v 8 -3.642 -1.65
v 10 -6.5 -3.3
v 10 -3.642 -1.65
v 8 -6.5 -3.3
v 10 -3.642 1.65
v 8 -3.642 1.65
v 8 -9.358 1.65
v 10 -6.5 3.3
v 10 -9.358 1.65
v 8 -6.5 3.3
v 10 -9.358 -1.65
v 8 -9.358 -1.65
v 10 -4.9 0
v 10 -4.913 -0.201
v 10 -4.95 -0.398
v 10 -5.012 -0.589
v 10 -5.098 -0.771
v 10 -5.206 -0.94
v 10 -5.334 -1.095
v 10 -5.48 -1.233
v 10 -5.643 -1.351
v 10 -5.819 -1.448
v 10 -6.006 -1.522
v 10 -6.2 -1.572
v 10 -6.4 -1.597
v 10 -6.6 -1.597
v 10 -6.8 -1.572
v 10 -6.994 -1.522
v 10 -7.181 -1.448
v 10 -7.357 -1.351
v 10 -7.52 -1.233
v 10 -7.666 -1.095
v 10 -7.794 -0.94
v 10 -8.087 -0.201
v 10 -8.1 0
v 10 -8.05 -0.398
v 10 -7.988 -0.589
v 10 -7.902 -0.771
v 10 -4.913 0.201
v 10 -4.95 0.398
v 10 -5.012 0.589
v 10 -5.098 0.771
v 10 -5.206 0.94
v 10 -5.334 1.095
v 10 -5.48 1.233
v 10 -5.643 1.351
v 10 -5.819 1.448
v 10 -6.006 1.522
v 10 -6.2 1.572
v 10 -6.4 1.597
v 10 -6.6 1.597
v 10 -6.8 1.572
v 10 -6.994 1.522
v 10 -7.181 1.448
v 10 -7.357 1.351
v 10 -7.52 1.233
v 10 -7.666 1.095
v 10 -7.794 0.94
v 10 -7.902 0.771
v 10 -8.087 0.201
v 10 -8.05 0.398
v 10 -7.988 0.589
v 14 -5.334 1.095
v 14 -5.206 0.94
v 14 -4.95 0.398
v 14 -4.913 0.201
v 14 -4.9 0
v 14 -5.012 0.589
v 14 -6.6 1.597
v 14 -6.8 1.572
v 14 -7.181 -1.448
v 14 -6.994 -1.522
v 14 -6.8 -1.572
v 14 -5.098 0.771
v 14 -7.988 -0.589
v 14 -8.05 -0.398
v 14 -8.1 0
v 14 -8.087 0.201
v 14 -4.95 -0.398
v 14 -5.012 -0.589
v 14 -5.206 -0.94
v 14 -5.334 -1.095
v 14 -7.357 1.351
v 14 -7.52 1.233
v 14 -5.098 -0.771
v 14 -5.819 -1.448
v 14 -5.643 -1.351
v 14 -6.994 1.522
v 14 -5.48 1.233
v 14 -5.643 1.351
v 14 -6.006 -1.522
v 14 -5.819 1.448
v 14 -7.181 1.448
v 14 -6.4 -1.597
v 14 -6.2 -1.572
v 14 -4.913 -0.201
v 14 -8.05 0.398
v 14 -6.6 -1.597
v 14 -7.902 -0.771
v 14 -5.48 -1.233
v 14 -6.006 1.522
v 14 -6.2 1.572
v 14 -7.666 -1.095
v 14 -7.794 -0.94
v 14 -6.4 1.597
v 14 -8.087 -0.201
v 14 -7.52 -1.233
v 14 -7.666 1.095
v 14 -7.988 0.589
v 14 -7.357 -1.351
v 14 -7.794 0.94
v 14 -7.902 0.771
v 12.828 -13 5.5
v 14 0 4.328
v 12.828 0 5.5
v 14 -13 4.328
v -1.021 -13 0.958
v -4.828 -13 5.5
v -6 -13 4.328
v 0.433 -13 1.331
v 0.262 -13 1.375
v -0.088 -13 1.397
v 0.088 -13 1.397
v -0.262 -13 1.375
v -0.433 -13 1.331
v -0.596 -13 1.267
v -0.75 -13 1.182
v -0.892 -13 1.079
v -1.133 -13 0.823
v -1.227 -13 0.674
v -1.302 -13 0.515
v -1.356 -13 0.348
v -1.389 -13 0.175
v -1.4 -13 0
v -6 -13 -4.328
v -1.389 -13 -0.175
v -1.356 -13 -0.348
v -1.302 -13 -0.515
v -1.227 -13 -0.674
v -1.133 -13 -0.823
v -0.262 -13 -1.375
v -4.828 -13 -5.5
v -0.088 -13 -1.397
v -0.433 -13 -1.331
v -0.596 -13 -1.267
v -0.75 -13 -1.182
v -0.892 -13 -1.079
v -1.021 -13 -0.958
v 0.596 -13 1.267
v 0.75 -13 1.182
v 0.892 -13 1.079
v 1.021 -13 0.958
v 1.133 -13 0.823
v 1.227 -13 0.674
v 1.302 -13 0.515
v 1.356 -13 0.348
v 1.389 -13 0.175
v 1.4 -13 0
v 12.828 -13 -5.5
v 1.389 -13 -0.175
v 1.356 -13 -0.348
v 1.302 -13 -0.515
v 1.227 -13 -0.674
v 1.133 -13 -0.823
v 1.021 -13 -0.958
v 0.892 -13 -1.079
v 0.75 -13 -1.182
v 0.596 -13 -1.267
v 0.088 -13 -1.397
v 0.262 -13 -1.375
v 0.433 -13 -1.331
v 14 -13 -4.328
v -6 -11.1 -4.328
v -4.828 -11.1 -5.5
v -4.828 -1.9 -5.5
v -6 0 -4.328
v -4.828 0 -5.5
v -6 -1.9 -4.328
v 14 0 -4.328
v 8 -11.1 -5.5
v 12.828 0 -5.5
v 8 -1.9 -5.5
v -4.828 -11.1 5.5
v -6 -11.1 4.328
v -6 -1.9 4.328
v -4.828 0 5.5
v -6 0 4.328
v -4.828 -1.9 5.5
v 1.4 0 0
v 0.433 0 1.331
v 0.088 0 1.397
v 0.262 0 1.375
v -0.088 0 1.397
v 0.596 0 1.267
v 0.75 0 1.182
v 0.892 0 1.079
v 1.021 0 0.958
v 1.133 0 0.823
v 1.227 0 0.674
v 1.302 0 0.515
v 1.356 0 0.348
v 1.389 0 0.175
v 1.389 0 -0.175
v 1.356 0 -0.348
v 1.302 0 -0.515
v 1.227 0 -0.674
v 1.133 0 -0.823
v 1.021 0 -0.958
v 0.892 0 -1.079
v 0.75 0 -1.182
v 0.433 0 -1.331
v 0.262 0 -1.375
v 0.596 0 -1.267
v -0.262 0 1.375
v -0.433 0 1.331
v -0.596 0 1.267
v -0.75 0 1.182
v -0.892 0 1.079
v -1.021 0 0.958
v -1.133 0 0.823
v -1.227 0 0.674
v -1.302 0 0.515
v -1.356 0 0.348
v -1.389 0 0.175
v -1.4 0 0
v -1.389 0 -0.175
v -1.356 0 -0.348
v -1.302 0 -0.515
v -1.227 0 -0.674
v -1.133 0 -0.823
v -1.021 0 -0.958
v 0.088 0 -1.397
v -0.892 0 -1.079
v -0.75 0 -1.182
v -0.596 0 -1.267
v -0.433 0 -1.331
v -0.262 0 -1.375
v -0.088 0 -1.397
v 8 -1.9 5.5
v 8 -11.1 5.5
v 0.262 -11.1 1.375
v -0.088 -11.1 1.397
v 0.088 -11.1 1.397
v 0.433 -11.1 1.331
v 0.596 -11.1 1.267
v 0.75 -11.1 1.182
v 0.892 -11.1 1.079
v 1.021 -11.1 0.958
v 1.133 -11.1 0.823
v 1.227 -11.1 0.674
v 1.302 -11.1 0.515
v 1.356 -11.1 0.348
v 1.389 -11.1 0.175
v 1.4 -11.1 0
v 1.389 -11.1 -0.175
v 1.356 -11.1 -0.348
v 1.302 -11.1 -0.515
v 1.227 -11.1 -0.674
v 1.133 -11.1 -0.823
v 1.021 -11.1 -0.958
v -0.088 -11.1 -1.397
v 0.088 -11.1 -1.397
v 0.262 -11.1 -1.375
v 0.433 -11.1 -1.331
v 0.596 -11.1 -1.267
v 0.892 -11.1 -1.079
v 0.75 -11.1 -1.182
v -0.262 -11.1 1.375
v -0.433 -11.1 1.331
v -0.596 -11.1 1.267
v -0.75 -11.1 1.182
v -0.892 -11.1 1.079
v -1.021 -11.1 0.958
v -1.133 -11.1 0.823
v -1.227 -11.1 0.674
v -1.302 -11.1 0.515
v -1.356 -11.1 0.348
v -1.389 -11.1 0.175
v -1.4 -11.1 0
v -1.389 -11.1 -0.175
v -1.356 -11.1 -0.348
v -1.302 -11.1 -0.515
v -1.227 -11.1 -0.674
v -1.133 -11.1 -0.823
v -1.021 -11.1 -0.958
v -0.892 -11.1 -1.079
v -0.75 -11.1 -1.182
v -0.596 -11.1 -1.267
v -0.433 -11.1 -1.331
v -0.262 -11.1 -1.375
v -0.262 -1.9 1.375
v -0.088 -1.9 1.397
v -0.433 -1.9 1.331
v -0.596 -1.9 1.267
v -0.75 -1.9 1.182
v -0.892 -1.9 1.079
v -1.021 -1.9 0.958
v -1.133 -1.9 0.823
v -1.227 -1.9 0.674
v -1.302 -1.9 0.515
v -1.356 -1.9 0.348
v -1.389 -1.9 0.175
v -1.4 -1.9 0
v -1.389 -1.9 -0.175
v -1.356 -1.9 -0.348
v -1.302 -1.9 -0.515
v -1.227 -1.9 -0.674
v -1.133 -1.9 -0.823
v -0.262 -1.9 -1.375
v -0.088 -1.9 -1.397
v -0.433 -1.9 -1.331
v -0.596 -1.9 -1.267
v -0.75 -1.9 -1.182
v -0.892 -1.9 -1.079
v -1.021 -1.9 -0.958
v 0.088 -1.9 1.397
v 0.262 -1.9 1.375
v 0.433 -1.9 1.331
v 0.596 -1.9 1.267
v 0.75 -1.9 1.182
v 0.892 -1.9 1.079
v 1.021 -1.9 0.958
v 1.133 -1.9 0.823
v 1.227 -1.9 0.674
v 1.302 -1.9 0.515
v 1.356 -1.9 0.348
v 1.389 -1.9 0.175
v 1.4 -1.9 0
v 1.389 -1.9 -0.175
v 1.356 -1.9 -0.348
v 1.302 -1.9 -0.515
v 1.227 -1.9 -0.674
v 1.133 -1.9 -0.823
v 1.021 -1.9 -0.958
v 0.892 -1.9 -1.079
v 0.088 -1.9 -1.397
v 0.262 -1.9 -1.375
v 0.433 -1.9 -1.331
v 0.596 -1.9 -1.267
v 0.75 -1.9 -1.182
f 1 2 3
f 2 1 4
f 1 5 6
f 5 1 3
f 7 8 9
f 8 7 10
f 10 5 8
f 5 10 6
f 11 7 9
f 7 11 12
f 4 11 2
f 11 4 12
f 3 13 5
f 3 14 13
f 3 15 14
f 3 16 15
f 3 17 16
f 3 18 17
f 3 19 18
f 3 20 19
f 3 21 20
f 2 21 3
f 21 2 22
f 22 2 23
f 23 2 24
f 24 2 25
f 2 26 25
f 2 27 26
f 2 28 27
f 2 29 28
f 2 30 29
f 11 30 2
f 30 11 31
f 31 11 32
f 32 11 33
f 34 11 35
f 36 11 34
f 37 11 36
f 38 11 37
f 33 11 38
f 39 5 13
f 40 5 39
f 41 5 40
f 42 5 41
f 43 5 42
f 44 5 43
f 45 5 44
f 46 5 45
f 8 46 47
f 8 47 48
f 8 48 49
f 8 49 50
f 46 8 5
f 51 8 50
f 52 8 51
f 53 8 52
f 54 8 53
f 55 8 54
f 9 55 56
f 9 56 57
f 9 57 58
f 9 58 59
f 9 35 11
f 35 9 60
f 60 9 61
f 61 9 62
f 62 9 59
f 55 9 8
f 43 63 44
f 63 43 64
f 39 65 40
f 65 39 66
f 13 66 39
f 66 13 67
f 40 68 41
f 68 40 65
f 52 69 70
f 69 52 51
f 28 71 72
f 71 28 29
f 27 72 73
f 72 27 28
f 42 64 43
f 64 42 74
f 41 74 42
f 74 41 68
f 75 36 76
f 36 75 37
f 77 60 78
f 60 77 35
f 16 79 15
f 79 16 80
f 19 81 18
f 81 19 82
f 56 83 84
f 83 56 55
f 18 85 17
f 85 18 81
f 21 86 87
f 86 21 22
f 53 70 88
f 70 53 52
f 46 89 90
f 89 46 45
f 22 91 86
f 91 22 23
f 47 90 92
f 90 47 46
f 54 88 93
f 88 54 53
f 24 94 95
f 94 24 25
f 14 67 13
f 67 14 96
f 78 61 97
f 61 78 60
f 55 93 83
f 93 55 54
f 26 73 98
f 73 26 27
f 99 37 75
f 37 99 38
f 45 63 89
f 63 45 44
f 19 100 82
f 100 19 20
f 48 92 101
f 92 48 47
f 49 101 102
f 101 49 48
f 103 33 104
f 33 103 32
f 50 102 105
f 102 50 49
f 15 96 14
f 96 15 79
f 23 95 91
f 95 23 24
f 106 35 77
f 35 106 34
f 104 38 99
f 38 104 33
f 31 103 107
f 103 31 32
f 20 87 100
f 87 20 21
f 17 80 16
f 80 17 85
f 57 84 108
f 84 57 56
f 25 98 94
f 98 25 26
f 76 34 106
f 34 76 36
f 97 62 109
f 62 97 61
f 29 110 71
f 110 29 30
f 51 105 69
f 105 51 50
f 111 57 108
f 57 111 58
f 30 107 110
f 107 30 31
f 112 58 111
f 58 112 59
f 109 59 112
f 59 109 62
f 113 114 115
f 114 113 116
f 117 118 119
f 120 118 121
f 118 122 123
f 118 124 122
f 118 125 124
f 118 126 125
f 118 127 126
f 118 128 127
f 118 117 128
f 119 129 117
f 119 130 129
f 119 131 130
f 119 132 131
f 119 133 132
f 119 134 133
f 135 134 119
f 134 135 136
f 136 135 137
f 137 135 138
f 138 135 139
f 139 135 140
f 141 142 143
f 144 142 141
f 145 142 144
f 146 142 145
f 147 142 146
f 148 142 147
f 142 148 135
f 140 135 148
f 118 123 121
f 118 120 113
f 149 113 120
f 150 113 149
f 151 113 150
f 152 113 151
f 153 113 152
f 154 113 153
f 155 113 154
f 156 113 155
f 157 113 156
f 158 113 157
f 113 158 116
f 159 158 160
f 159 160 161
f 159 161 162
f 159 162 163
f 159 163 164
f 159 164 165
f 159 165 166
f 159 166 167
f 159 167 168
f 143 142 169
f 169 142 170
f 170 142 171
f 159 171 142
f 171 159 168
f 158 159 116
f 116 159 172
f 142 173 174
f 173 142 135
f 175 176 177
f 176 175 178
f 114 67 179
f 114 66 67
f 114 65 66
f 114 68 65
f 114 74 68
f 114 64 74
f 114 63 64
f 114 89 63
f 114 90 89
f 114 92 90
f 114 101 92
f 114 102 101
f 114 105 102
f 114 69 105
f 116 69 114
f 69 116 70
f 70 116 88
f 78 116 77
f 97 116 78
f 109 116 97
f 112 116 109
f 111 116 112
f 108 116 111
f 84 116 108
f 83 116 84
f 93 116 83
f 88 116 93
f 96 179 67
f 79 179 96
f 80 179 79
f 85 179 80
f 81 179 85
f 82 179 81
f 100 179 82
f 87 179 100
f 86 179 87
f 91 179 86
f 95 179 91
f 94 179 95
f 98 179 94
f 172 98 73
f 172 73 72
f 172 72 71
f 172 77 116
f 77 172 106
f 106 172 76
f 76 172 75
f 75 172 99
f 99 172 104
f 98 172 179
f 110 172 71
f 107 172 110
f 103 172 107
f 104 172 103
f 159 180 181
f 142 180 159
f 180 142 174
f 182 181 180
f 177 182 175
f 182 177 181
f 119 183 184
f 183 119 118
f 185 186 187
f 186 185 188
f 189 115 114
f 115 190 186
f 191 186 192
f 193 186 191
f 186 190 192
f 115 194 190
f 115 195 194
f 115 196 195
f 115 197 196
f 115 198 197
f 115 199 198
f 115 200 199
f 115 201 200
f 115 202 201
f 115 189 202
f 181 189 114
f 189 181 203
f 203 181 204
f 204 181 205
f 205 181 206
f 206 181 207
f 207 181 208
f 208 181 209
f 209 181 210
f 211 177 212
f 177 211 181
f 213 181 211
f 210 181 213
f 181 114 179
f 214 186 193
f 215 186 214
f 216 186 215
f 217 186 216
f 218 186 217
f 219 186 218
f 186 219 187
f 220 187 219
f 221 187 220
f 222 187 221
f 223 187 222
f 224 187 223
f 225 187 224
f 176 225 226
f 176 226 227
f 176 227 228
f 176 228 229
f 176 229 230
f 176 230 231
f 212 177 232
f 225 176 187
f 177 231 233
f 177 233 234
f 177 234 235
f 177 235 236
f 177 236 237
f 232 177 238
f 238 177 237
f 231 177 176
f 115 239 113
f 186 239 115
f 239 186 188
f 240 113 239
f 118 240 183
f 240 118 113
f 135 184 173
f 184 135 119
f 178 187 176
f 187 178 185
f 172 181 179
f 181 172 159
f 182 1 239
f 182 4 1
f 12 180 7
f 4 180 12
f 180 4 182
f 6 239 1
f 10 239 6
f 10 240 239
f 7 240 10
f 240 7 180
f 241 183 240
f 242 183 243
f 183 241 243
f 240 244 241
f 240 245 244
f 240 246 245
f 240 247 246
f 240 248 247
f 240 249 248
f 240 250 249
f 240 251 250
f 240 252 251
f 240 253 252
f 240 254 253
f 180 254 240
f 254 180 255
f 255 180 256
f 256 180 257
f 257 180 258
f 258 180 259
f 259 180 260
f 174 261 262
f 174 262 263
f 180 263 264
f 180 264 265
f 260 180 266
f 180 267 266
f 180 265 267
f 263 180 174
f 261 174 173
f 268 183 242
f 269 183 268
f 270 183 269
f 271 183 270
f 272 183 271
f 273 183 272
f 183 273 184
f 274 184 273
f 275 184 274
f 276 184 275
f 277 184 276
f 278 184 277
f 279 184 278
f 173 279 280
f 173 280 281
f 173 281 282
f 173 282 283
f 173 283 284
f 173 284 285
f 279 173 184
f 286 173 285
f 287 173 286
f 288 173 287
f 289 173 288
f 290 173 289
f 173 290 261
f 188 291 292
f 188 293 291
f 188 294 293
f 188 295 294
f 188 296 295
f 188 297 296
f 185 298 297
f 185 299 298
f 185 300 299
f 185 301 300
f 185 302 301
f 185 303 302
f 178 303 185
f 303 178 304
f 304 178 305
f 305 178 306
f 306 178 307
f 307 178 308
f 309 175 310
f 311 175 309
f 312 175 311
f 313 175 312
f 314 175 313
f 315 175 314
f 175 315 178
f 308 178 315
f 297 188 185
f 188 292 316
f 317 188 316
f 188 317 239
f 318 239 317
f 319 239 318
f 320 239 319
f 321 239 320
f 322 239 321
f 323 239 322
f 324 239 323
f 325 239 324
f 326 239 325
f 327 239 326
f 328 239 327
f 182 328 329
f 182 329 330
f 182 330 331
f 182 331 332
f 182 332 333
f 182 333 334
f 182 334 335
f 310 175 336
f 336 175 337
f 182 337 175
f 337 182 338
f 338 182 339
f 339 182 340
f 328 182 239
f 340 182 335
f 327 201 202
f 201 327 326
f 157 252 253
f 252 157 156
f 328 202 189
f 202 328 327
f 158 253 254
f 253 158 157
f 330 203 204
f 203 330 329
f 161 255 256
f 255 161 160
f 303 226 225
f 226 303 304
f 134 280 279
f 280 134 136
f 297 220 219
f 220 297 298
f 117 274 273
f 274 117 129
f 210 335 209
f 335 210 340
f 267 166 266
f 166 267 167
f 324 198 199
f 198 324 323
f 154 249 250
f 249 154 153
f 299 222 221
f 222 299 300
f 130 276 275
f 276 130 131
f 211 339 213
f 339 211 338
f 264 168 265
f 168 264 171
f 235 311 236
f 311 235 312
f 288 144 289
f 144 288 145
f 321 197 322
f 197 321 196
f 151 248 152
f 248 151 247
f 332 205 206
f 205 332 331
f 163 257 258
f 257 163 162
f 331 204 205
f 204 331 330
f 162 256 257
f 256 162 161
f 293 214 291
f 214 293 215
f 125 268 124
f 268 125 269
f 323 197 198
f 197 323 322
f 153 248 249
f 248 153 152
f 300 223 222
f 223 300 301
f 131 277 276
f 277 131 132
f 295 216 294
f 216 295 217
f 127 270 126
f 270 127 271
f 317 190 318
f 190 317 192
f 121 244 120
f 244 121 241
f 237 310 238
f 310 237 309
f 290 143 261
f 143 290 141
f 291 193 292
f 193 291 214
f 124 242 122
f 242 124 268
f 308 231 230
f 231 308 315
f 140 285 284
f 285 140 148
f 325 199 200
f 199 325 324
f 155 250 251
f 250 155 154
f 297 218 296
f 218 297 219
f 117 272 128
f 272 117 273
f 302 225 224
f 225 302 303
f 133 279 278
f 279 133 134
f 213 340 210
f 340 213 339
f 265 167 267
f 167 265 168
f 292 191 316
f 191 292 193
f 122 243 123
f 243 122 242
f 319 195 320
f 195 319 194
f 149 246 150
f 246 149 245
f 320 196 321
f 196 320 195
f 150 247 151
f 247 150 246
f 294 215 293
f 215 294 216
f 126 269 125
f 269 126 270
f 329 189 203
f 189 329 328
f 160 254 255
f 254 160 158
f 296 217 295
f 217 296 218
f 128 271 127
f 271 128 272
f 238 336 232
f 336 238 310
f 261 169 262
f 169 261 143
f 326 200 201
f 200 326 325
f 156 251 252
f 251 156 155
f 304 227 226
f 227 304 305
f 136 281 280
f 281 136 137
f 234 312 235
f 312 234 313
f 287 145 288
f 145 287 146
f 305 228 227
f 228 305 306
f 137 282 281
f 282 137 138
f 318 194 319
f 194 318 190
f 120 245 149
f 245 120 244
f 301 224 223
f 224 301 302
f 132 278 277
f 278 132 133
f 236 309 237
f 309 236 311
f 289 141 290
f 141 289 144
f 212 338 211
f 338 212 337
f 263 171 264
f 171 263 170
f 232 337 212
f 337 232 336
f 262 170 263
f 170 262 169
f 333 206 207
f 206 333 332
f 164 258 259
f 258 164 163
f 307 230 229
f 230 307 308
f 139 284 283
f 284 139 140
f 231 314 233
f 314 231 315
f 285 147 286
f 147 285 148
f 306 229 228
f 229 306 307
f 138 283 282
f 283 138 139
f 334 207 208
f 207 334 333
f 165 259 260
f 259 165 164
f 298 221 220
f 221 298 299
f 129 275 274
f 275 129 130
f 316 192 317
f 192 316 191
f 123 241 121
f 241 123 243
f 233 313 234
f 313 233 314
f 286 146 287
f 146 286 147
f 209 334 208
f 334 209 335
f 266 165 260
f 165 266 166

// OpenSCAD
// file: lib/foldaDDE.scad
//--------------------------------------------------------
//  ---- Custom modules for Foldarap DDE 3D printer ----
//--------------------------------------------------------
// (c) 2018-2019 Isidoro Gayo Vélez 
// <isidoro.gayo@gmail.com>

// Credits:
// -- Enmanuel Gillot, for his superb fodable 3D printer

//---------------------------------------------------------
// Released under the terms of GNU/GPL v3.0 or higher
//---------------------------------------------------------


module board_holder(){

// OVM20Lite holder
    
    difference(){
        
        union(){
            translate([0,wslot/2+5,0]){
                cylinder(h=wslot,d=10);
                translate([-5,-5,0])
                    cube([10,5,wslot]);
            }
            
            translate([0,5,wslot])
            hull(){
                for(y=[-wslot/2,wslot/2]){
                    translate([0,y,0])
                        cylinder(h=thwall,d=10);
                }
            }
        }
        
        for(y=[[0,2.1],[wslot/2+5,1.4]]){
            translate([0,y[0],wslot-1])
                cylinder(h=thwall+2,r=y[1]);
        }
        
        translate([0,wslot/2-1,wslot/2])
        rotate([-90,0,0])
            cylinder(h=10,d=4);

        translate([-6,wslot/2+thwall,-1])
            cube([12,12,wslot]);
        
        translate([0,wslot/2+5,wslot-thwall-0.5])
        union(){
        rotate([0,0,30])
            cylinder(h=3,r=3.2,$fn=6);
            sphere(r=3.2);
        }
    }
}


module ovm20lite(){

// fake OVM20Lite card, just for reference

    difference(){    
        translate([-50,-30,0])
        union(){
            difference(){
                linear_extrude(height=1.6)
                    square([100,60]);
        
                for(pos=[[14,9.4,-1],
                        [15,60-2.54,-1],
                        [96.5,9.4,-1],
                        [90,60-2.54,-1]]){
                    translate(pos)
                        cylinder(h=4,r=1.6);
                }
            }
        }
        for(pos=[[[50-3,30-3,-1],[0,0,0]],
                [[-50+3,30-3,-1],[0,0,90]],
                [[-50+3,-30+3,-1],[0,0,180]],
                [[50-3,-30+3,-1],[0,0,270]]]){
            translate(pos[0])
            rotate(pos[1])
                rounded_corner(lg=5,rd=3);
        }
    }
}


module board_holder_model(){
    
// Auxiliar module
    
    // fake control board
    color("lightgreen")
    translate([0,42.5,1.2*wslot])
    rotate([0,0,180])
        ovm20lite();
    
    // fake aluminium profile
    %translate([0,10,6.5])
    rotate([0,90,0])
    linear_extrude(height=150,center=true)
        import("aux/MP20x20T_I.dxf");
    
    //rotate([0,180,0])
    translate([35,0,0])
        board_holder();
}


module fan_pipe(l=45,isize=8){

// Support for an axial fan (diameter 45 mm)
// isize = inductive diameter, default for a M8 inductive
    
    difference(){
        union(){
            // main body
            difference(){
                difference(){
                    cube([14,19,l+5]);
                
                    translate([2,2,-5])cube([10,15,1.5*l]);
                    translate([0,16,l+25])rotate([0,90,0])
                        cylinder(h=35,r=25,$fn=90);
                }
                // fixing slot for axial fan
                translate([0,0,l-5])difference(){
                    translate([-2,-3,0])cube([20,25,12]);
                
                    translate([1,1,-2])cube([12,17,15]);
                }
            }
            // upper fixing screw
            translate([0,9.5,l-10])rotate([0,90,0])
                cylinder(h=14,r=3.5,$fn=80);
            // inductive holder
            translate([((isize+4)/2)+14,9.5,0])difference(){
                union(){
                    hull(){
                        translate([-(isize+4)/2,-(isize+4)/2,0])
                            cube([1,isize+4,10]);
                        cylinder(h=10,r=(isize+4)/2,$fn=80);
                    }
                    translate([isize/2,-2,0])difference(){
                        // inductive clamp
                        cube([8,4,10]);
                    
                        // M3 drill to get the slot tight
                        translate([5,10,5])rotate([90,0,0])
                            cylinder(h=20,r=1.6,$fn=60);
                        // rounded corners in inductive clamp
                        translate([3,6,5])rotate([90,0,0])
                            rounded_corner(lg=10);
                        translate([3,6,5])rotate([90,90,0])
                            rounded_corner(lg=10);
                    }
                }
                // internal hole for inductive sensor
                translate([0,0,-5])
                    cylinder(h=25,r=(isize/2)+0.1,$fn=60);
                // adjustement slot
                translate([0,-0.5,-5])cube([2*isize,1,25]);
            }
        }
        // taladro tornillo fijador superior
        translate([-5,9.5,l-10])rotate([0,90,0])
            cylinder(h=30,r=1.6,$fn=80);
        translate([12,9.5,l-10])rotate([0,90,0])
            cylinder(h=5,r=3.2,$fn=60);
        // taladro tornillo fijador inferior...
        translate([-5,9.5,3.5])rotate([0,90,0])
            cylinder(h=25,r=1.6,$fn=80);
        // ...contratuerca...
        translate([13.5,9.5,3.5])rotate([30,0,0])rotate([0,90,0])
            cylinder(h=5,r=3.2,$fn=6);
        // ...y cabeza del tornillo
        //translate([-2.5,9.5,3.5])rotate([0,90,0])
        //    cylinder(h=5,r=3.5,$fn=80);
        // test: plano de corte
        //color("red")translate([-20,-20,-l/2])cube([60,30,2*l]);
    }
}


module fan_nozzle(){

    difference(){
        union(){
            translate([0,0,1.9])difference(){
                cube([10,15,7]);
                translate([1,1,-2])cube([8,13,15]);
            }
        // tornillo fijador
        translate([1,7.5,5.5])rotate([0,90,0])
            cylinder(h=8,r=2.6,$fn=80);
        }
        // taladro tornillo fijador
        translate([-5,7.5,5.5])rotate([0,90,0])
            cylinder(h=30,r=1.6,$fn=80);
    }
    difference(){
        //color("grey")
        hull(){
            translate([-2,-2,0])difference(){
                cube([14,19,2]);
                translate([2,2,-2])cube([10,15,15]);
            }
            
            translate([-18,-2,-16])cube([5,19,1]);
        }
        hull(){
            translate([1,1,1])cube([8,13,1]);
                  
            translate([-16.6,1,-16])cube([1,13,1]);
        }
        translate([-18,-8,-20])rotate([0,-20,0])cube([5,30,10]);
        // test: plano de corte
        //color("crimson")translate([-40,-12,-18])cube([60,20,30]);
    }
}
// main file
//------------------------------------------------------------
//---- 3D printed pieces for Scalable Foldarap 3D printer ----
//------------------------------------------------------------
// (c) 2018-2019 Isidoro Gayo Vélez (isidoro.gayo@gmail.com)

// Credits:
// -- Enmanuel Gillot, for his superb fodable 3D printer

//------------------------------------------------------------
//      Released under the terms of GNU/GPL v3.0 or higher
//------------------------------------------------------------

include <lib/core.scad>
include <lib/misc.scad>
include <lib/X_axis.scad>
include <lib/Y_axis.scad>
include <lib/Z_axis.scad>
include <lib/extruder.scad>
include <lib/foldaDDE.scad>


// Parameters to modify. 
// Try to NOT modify variables in other places.
NEMA14=34;      // NEMA14 width in mm
NEMA17=42;      // NEMA17 width in mm
wslot=20;		// aluminium slot width in mm
lslot=wslot;	// aluminium slot lenght in mm
thwall=3.5;     // wall thickness
span=NEMA17;    // span between horizontal profiles on Y axis
footl=2.5*wslot;// foot lenght
ease=0.2;       // clearance to fit the aluminum profile easier
stepper=17;     // type of stepper motor;e.g. 14 = NEMA14, and so...

lbearing=24;    // bearing lenght in mm for a 8mm smooth rod
rbearing=7.5;   // M8 bearing radius in mm
rrod=3;         // smooth rod radius in mm
drod=130;       // distance between Y rods in mm
bhole=100/2;  // M3 hole distance from bed center
//bhole=95.25/2;  // for Miniheatbed, by F. Malpartida


$fn = 50;



// ******** ---- FoldaRap DDE ----- *********

// ----- X axis -----

//translate([wslot+2*thwall+1,-30,-2])
//rotate([90,0,90])
    //x_carriage();
    
//x_motor_holder(hg=NEMA17,stepper=17,thick=6.5);

//translate([-3*thwall-wslot,2*thwall+wslot,0])
    //x_motor_idler();

/*
translate([20,5,0])
rotate([90,0,0])
    sync_bearing_holder(span=13);
*/



// ----- Y axis -----

//y_endstop_adj();

//translate([0,30,4])
//rotate([180,0,0])
  //  knob(thk=4,dia=16,spc=false,mt=3,nk=12,dk=2);

//y_motor_idler(bd=20);
//translate([20,5,0])
rotate([90,0,0])
    sync_bearing_holder(hg=7);
    
//IEC_plate();

//y_motor_holder(stepper=17,thick=10);

//y_rod_holder();

/*
difference(){

y_belt_clamp(cs=2*lbearing+3,ch=23);
translate([0,-7,-1])
        hollow(rd=3,lg=25,wd=12);
}
*/

//frog(ad=35);

// you have to print two of these
//y_bearing_clamp();

//translate([0,10,0])
  //  foot(lg=footl,mt=4);
//mirror([0,1,0])
  //  foot(lg=footl,mt=4);



// ----- Z axis -----

//translate([0,10,0])
    //z_motor_holder(mt=4);
//translate([-3*thwall-wslot,2*thwall+wslot+1,0])
//mirror([0,1,0])
  //  z_motor_holder(mt=4);

//translate([0,10,44.5])
//rotate([-90,0,0])
  //  z_hinge_outter(bsd=9,ssd=8);
//z_hinge_inner(mt=4);

//z_upper_joint(mt=4);



// ----- Extruder -----

//extruder_idler();

//fan_pipe(l=40,isize=8);
//rotate([90,0,0])
    //fan_nozzle();

//rotate([180,0,0])
    //knob(thk=5,dia=7,nk=8,dk=2,spc=false);

//extruder();

//extruder_holder();

//extruder_wire_fastener();

//rotate([0,180,0])
  //  x_wire_fastener();



// ----- Miscelaneous -----

//spool_holder();
///spool_clamp();
//knob_clamp(altura=10, radio=5, paso=30);
//spool_knob(hg=14);

//psu_holder();

//handle();

// board holder only for OVM20 Lite!!
//rotate([0,180,0])
  //  board_holder();



// ******** ---- EoFRDDE ----- *********
